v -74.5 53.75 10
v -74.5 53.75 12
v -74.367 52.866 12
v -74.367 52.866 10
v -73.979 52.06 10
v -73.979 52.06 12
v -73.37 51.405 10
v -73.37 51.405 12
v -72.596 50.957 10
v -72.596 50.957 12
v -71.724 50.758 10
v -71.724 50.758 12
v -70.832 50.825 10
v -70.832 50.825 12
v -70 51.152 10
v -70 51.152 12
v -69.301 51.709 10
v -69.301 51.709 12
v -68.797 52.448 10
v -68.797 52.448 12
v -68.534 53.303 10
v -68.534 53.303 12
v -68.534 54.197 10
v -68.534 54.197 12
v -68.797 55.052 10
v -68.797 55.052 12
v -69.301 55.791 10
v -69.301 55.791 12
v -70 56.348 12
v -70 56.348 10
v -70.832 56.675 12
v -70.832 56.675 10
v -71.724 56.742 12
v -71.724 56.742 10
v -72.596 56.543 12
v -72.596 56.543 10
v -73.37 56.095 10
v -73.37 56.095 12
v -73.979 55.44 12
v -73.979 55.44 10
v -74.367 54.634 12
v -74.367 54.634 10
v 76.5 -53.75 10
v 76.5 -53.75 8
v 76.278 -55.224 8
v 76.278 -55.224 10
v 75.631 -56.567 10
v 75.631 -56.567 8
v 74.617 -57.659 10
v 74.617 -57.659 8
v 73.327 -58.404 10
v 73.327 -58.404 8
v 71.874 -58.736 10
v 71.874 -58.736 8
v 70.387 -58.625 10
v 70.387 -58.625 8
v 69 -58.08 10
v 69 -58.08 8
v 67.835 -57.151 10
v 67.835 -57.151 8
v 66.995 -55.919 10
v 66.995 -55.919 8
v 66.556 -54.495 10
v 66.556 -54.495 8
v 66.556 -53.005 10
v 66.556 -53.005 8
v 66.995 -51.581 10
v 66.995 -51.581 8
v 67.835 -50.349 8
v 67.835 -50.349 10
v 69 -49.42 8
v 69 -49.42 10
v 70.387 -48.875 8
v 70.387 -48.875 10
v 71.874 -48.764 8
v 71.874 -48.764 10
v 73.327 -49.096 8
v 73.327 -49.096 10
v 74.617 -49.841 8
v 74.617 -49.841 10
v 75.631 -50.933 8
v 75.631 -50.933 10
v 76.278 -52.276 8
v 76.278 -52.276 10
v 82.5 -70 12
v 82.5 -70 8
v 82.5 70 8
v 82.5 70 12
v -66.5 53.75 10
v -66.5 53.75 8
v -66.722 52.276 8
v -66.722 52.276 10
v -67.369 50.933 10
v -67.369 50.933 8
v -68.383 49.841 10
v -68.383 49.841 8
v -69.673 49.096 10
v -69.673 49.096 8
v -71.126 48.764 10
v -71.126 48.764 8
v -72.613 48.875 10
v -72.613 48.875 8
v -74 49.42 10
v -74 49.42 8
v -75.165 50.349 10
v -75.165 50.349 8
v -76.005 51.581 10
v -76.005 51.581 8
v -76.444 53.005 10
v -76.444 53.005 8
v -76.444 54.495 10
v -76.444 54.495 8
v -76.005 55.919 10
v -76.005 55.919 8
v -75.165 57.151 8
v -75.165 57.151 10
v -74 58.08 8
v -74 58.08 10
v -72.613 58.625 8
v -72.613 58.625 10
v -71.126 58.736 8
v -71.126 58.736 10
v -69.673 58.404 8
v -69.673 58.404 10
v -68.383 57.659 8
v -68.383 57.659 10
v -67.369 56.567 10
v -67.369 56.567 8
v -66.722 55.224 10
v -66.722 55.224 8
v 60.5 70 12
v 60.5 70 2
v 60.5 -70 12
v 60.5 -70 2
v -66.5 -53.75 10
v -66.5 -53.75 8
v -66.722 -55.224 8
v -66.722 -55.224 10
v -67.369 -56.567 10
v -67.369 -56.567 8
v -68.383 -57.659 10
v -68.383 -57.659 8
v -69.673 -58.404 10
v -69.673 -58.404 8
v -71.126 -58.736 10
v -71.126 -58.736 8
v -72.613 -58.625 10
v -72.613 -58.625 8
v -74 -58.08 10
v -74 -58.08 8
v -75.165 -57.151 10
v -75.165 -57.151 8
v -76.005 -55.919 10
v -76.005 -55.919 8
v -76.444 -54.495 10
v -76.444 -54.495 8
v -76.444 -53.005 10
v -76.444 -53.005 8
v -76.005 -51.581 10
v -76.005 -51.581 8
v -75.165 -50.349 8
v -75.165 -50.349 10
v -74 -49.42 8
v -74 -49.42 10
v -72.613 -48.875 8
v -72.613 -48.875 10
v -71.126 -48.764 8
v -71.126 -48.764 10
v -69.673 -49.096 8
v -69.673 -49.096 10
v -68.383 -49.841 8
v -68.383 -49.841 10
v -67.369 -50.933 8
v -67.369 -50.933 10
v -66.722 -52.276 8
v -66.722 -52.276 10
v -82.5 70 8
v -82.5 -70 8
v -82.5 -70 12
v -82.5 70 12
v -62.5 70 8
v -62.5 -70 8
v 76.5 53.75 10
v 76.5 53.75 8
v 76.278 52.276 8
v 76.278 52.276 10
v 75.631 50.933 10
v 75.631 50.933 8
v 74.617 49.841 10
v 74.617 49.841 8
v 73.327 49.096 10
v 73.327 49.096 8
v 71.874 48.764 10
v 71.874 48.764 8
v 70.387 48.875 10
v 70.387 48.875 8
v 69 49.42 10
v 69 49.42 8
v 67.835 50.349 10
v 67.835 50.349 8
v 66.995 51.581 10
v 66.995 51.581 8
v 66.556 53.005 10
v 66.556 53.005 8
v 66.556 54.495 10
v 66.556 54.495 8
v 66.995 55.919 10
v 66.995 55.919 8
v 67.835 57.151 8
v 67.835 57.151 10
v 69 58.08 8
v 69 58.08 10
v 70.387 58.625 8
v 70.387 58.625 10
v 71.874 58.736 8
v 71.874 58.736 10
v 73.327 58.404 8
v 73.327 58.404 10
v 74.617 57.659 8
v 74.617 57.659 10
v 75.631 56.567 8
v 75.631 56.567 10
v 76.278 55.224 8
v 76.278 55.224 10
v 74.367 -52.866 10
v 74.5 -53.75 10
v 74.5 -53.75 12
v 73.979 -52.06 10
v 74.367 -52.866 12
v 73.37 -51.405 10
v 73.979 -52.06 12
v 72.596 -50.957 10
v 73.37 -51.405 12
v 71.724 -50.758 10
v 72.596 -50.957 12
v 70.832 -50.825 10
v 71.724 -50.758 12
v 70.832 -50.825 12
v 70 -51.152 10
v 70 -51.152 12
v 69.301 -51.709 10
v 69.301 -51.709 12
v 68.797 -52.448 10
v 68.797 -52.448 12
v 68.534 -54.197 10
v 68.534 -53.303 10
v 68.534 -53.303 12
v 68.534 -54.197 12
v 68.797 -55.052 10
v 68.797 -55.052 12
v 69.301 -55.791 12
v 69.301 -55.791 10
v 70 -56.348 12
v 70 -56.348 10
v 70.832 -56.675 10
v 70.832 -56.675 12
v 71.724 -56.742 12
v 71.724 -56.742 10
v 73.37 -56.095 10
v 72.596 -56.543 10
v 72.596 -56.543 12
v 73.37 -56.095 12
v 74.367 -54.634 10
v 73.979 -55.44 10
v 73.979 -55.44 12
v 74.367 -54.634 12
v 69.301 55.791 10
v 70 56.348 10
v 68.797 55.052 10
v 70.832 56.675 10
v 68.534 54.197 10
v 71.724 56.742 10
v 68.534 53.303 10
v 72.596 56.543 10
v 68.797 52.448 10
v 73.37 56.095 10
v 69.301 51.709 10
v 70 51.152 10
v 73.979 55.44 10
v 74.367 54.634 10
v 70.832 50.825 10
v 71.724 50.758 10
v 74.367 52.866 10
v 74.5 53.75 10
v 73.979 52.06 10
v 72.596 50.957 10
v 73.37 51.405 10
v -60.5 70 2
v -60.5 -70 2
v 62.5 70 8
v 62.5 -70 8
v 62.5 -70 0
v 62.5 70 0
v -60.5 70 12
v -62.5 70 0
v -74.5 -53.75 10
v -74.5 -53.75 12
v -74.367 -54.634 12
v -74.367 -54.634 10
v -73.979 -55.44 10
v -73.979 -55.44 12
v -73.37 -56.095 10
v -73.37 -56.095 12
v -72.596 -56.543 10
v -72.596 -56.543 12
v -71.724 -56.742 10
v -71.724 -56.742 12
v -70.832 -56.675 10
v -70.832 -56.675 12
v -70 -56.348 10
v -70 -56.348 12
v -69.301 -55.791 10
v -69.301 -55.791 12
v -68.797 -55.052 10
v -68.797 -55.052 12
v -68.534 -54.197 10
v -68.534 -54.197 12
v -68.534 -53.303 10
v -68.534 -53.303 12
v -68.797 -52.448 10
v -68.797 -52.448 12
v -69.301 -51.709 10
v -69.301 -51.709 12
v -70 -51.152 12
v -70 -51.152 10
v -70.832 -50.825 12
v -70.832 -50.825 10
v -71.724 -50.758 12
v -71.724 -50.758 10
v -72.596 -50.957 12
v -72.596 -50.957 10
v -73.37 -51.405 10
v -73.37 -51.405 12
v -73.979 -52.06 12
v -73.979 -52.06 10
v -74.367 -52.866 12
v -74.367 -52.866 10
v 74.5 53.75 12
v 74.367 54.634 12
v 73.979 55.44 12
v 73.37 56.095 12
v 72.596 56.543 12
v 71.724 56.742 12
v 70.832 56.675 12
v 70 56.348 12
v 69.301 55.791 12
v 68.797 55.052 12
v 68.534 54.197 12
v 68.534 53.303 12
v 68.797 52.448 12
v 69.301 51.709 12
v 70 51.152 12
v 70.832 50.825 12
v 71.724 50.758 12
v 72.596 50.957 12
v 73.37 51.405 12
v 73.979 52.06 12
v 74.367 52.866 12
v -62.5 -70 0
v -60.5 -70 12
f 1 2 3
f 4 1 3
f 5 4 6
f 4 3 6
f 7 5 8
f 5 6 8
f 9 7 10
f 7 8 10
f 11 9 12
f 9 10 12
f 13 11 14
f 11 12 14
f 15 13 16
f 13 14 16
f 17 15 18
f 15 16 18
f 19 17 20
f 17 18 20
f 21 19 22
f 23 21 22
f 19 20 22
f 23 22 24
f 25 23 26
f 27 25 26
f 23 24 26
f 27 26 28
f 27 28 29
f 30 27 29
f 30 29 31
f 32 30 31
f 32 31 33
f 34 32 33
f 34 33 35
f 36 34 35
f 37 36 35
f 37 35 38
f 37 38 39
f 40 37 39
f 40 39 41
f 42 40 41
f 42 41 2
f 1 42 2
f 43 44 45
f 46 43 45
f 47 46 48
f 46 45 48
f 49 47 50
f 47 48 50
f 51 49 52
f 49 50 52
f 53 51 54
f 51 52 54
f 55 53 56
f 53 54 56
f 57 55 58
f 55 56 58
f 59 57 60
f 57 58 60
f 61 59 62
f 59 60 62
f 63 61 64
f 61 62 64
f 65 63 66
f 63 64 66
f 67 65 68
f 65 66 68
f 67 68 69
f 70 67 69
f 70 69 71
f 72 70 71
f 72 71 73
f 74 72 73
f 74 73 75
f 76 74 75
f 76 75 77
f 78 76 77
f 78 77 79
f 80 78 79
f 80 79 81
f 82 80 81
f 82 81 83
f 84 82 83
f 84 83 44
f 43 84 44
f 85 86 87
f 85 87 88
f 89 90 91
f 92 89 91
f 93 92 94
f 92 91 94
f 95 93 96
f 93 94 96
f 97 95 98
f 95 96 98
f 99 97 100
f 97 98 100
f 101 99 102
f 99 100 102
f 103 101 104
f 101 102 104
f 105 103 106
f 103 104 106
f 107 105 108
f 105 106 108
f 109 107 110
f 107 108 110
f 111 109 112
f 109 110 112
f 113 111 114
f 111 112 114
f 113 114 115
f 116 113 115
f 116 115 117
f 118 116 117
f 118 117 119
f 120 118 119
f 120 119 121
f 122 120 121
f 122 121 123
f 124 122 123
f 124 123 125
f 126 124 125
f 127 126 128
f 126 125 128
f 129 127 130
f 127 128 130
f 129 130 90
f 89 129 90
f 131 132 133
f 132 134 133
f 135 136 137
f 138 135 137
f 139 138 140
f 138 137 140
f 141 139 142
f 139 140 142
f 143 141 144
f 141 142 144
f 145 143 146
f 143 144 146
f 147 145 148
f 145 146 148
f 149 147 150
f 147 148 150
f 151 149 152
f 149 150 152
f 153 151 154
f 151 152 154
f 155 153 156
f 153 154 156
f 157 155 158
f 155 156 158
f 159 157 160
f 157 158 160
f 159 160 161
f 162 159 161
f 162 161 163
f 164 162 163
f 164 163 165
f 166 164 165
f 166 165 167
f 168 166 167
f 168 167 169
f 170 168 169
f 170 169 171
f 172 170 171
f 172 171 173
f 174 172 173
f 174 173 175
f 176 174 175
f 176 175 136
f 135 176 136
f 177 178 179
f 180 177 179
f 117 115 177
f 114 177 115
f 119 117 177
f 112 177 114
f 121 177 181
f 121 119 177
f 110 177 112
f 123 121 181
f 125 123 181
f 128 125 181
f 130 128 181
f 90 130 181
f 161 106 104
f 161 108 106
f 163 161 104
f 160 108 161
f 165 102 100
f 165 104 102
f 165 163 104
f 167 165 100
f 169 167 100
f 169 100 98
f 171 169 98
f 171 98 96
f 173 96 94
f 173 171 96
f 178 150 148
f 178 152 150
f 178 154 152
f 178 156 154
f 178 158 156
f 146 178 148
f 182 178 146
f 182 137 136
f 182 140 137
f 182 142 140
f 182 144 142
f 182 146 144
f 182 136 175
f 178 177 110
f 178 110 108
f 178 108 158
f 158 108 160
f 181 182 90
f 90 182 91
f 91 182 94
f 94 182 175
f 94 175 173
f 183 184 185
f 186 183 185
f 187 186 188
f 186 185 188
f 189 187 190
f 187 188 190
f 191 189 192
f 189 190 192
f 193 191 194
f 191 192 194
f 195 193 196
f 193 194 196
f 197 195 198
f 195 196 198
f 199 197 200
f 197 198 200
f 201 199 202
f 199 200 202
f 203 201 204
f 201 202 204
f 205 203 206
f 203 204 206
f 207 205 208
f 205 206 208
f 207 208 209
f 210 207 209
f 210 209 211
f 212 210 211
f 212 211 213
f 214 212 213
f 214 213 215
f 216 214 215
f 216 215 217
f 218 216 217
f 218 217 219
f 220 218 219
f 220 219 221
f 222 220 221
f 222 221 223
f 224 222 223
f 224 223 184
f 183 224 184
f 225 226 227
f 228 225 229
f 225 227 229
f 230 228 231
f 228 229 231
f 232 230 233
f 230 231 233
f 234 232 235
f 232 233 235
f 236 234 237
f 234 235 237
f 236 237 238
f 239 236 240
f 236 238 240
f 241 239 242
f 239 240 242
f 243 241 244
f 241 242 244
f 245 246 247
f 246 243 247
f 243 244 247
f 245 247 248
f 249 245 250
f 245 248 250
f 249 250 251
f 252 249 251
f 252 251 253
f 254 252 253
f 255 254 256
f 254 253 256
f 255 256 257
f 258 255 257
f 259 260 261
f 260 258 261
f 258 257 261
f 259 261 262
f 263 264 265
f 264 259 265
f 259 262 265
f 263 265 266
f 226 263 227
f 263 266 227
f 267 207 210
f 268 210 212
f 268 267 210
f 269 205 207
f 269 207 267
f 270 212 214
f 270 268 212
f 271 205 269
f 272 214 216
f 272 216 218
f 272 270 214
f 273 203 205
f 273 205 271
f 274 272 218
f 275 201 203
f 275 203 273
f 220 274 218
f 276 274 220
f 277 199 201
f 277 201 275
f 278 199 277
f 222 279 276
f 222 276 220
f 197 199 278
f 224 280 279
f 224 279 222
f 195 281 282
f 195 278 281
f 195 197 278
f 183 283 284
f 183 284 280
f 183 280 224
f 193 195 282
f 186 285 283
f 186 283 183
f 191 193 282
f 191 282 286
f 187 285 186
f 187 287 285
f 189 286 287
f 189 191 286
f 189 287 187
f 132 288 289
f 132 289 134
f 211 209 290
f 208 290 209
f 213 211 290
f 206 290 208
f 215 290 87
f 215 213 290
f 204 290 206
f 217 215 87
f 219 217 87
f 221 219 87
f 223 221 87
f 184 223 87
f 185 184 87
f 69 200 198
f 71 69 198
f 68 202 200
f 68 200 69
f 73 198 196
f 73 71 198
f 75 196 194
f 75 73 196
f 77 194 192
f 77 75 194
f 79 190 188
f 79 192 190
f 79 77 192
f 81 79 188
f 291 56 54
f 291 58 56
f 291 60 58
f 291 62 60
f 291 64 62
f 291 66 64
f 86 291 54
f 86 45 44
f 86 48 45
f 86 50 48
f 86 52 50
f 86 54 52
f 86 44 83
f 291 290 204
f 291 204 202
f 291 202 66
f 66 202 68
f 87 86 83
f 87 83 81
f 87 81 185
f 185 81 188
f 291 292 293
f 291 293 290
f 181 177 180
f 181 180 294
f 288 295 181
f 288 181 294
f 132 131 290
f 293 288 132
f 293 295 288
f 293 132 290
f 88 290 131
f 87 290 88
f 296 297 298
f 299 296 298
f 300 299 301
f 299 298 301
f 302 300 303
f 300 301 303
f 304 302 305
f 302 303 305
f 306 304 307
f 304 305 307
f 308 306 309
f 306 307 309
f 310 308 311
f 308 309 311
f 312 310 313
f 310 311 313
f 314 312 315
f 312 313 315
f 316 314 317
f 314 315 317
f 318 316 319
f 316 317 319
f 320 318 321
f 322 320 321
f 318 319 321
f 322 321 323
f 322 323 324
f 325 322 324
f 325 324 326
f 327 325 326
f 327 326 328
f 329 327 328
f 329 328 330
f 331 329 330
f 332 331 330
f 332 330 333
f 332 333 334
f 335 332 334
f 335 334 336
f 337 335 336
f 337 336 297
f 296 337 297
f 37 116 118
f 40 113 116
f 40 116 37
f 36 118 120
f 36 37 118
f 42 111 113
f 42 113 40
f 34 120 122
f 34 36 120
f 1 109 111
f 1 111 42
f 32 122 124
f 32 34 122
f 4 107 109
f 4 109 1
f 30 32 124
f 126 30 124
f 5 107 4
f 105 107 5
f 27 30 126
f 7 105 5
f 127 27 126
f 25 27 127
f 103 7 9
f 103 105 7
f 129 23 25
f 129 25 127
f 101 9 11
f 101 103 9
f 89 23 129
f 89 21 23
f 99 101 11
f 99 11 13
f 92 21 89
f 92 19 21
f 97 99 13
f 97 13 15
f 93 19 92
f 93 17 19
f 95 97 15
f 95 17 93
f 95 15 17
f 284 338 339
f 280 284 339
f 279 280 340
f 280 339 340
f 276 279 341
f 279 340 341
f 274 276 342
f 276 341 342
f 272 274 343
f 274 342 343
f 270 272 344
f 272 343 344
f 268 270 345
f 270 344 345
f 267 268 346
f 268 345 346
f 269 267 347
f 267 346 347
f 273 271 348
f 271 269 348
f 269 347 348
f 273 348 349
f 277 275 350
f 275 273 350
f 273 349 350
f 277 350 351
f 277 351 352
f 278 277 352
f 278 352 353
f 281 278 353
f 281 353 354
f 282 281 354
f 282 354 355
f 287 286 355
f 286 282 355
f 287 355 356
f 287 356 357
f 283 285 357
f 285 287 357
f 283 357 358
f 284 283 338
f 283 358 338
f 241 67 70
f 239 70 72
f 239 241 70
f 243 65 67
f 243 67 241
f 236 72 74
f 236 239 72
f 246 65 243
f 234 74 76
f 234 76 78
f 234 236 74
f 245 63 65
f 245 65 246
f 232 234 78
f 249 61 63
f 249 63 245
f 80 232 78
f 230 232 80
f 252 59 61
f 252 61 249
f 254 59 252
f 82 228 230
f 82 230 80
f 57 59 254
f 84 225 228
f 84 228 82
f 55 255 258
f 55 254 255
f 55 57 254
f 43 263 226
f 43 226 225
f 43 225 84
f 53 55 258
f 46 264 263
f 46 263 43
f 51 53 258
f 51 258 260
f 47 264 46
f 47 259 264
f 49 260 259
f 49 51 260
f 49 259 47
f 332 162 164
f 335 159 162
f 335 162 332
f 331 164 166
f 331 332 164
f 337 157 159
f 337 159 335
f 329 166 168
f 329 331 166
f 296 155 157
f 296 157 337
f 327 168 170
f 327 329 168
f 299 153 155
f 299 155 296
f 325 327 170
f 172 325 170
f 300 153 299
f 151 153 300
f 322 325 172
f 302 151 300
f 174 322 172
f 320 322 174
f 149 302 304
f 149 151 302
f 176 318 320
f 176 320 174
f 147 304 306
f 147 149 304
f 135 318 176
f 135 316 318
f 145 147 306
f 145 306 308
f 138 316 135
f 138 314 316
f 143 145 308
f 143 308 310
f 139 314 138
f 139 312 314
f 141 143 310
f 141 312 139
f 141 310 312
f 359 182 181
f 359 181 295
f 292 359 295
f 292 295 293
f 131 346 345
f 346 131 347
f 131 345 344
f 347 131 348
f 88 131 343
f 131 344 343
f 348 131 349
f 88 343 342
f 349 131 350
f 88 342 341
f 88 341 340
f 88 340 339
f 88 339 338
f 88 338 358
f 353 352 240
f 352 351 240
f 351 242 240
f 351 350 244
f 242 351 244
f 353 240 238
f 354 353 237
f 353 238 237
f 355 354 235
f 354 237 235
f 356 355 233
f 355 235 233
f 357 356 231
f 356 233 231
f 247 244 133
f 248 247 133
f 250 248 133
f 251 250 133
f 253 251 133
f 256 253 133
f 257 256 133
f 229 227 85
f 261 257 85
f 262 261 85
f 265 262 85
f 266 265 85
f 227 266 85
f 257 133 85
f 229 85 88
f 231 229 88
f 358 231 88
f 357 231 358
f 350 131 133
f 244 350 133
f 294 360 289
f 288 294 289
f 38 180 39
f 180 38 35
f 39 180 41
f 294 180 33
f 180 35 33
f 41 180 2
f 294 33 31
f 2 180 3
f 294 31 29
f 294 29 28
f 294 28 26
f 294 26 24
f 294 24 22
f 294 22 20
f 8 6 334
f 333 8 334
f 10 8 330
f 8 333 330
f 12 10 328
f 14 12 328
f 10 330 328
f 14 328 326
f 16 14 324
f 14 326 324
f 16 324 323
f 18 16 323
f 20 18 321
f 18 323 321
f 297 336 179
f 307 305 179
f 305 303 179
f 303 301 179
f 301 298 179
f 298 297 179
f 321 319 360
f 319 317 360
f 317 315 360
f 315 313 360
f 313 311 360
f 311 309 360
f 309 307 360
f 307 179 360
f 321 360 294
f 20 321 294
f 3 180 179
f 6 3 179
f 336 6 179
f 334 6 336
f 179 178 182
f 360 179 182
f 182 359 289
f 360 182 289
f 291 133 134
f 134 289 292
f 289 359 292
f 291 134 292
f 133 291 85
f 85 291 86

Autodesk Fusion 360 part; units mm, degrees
sketch "extrusion" plane through (0, 0, 0) normal (0, 1, 0) x (1, 0, 0)
  line L0 (-82.5, -8) -> (-62.5, -8)
  line L1 (-62.5, -8) -> (-62.5, 0)
  line L2 (-62.5, 0) -> (62.5, 0)
  line L3 (62.5, 0) -> (62.5, -8)
  line L4 (62.5, -8) -> (82.5, -8)
  line L5 (-60.5, -12) -> (-60.5, -2)
  line L6 (-60.5, -2) -> (60.5, -2)
  line L7 (60.5, -2) -> (60.5, -12)
  line L8 (-82.5, -12) -> (-60.5, -12)
  line L9 (60.5, -12) -> (82.5, -12)
  line L10 (-82.5, -8) -> (-82.5, -12)
  line L11 (82.5, -8) -> (82.5, -12)
  dimension "d1" = 125
  dimension "d2" = 8
  dimension "d3" = 20
  dimension "d4" = 8
  dimension "d5" = 20
extrude "Extrude1" add sketch "extrusion" along normal mid plane 140
sketch "top holes" plane through (0, 0, 12) normal (0, 0, 1) x (-1, 0, 0)
  circle A0 centre (71.5, -53.75) radius 3
  line L0 (82.5, -70) -> (60.5, -70)
  point P0 (71.5, -70)
  dimension "d11" = 6
  dimension "d12" = 16.25
extrude "Extrude2" cut sketch "top holes" against normal blind 4
mirror "Mirror1" about plane through (0, 0, 0) normal (1, 0, 0) of "Extrude2"
mirror "Mirror2" about plane through (0, 0, 0) normal (0, 1, 0) of "Extrude2", "Mirror1"
sketch "Sketch5" plane through (0, 0, 8) normal (0, 0, -1) x (1, 0, 0)
  circle A0 centre (71.5, 53.75) radius 3
  circle A1 centre (71.5, -53.75) radius 3
  line L0 (62.5, 70) -> (62.5, -70)
  line L1 (62.5, -70) -> (82.5, -70)
  line L2 (82.5, -70) -> (82.5, 70)
  line L3 (82.5, 70) -> (62.5, 70)
  circle A2 centre (71.5, 53.75) radius 5
  dimension "d35" = 10
extrude "Extrude6" cut sketch "Sketch5" against normal blind 2 contours A2
sketch "Sketch6" plane through (0, 0, 8) normal (0, 0, -1) x (1, 0, 0)
  circle A0 centre (71.5, 53.75) radius 5
  circle A1 centre (71.5, -53.75) radius 3
  line L0 (62.5, 70) -> (62.5, -70)
  line L1 (62.5, -70) -> (82.5, -70)
  line L2 (82.5, -70) -> (82.5, 70)
  line L3 (82.5, 70) -> (62.5, 70)
  circle A2 centre (71.5, -53.75) radius 5
  dimension "d38" = 10
extrude "Extrude7" cut sketch "Sketch6" against normal blind 2 contours A2
sketch "Sketch7" plane through (0, 0, 8) normal (0, 0, -1) x (1, 0, 0)
  circle A0 centre (-71.5, 53.75) radius 3
  circle A1 centre (-71.5, -53.75) radius 3
  line L0 (-82.5, 70) -> (-82.5, -70)
  line L1 (-82.5, -70) -> (-62.5, -70)
  line L2 (-62.5, -70) -> (-62.5, 70)
  line L3 (-62.5, 70) -> (-82.5, 70)
  circle A2 centre (-71.5, 53.75) radius 5
  dimension "d41" = 10
extrude "Extrude8" cut sketch "Sketch7" against normal blind 2 contours A2
sketch "Sketch8" plane through (0, 0, 8) normal (0, 0, -1) x (1, 0, 0)
  circle A0 centre (-71.5, 53.75) radius 5
  circle A1 centre (-71.5, -53.75) radius 3
  line L0 (-82.5, 70) -> (-82.5, -70)
  line L1 (-82.5, -70) -> (-62.5, -70)
  line L2 (-62.5, -70) -> (-62.5, 70)
  line L3 (-62.5, 70) -> (-82.5, 70)
  circle A2 centre (-71.5, -53.75) radius 5
  dimension "d44" = 10
extrude "Extrude9" cut sketch "Sketch8" against normal blind 2 contours A2
